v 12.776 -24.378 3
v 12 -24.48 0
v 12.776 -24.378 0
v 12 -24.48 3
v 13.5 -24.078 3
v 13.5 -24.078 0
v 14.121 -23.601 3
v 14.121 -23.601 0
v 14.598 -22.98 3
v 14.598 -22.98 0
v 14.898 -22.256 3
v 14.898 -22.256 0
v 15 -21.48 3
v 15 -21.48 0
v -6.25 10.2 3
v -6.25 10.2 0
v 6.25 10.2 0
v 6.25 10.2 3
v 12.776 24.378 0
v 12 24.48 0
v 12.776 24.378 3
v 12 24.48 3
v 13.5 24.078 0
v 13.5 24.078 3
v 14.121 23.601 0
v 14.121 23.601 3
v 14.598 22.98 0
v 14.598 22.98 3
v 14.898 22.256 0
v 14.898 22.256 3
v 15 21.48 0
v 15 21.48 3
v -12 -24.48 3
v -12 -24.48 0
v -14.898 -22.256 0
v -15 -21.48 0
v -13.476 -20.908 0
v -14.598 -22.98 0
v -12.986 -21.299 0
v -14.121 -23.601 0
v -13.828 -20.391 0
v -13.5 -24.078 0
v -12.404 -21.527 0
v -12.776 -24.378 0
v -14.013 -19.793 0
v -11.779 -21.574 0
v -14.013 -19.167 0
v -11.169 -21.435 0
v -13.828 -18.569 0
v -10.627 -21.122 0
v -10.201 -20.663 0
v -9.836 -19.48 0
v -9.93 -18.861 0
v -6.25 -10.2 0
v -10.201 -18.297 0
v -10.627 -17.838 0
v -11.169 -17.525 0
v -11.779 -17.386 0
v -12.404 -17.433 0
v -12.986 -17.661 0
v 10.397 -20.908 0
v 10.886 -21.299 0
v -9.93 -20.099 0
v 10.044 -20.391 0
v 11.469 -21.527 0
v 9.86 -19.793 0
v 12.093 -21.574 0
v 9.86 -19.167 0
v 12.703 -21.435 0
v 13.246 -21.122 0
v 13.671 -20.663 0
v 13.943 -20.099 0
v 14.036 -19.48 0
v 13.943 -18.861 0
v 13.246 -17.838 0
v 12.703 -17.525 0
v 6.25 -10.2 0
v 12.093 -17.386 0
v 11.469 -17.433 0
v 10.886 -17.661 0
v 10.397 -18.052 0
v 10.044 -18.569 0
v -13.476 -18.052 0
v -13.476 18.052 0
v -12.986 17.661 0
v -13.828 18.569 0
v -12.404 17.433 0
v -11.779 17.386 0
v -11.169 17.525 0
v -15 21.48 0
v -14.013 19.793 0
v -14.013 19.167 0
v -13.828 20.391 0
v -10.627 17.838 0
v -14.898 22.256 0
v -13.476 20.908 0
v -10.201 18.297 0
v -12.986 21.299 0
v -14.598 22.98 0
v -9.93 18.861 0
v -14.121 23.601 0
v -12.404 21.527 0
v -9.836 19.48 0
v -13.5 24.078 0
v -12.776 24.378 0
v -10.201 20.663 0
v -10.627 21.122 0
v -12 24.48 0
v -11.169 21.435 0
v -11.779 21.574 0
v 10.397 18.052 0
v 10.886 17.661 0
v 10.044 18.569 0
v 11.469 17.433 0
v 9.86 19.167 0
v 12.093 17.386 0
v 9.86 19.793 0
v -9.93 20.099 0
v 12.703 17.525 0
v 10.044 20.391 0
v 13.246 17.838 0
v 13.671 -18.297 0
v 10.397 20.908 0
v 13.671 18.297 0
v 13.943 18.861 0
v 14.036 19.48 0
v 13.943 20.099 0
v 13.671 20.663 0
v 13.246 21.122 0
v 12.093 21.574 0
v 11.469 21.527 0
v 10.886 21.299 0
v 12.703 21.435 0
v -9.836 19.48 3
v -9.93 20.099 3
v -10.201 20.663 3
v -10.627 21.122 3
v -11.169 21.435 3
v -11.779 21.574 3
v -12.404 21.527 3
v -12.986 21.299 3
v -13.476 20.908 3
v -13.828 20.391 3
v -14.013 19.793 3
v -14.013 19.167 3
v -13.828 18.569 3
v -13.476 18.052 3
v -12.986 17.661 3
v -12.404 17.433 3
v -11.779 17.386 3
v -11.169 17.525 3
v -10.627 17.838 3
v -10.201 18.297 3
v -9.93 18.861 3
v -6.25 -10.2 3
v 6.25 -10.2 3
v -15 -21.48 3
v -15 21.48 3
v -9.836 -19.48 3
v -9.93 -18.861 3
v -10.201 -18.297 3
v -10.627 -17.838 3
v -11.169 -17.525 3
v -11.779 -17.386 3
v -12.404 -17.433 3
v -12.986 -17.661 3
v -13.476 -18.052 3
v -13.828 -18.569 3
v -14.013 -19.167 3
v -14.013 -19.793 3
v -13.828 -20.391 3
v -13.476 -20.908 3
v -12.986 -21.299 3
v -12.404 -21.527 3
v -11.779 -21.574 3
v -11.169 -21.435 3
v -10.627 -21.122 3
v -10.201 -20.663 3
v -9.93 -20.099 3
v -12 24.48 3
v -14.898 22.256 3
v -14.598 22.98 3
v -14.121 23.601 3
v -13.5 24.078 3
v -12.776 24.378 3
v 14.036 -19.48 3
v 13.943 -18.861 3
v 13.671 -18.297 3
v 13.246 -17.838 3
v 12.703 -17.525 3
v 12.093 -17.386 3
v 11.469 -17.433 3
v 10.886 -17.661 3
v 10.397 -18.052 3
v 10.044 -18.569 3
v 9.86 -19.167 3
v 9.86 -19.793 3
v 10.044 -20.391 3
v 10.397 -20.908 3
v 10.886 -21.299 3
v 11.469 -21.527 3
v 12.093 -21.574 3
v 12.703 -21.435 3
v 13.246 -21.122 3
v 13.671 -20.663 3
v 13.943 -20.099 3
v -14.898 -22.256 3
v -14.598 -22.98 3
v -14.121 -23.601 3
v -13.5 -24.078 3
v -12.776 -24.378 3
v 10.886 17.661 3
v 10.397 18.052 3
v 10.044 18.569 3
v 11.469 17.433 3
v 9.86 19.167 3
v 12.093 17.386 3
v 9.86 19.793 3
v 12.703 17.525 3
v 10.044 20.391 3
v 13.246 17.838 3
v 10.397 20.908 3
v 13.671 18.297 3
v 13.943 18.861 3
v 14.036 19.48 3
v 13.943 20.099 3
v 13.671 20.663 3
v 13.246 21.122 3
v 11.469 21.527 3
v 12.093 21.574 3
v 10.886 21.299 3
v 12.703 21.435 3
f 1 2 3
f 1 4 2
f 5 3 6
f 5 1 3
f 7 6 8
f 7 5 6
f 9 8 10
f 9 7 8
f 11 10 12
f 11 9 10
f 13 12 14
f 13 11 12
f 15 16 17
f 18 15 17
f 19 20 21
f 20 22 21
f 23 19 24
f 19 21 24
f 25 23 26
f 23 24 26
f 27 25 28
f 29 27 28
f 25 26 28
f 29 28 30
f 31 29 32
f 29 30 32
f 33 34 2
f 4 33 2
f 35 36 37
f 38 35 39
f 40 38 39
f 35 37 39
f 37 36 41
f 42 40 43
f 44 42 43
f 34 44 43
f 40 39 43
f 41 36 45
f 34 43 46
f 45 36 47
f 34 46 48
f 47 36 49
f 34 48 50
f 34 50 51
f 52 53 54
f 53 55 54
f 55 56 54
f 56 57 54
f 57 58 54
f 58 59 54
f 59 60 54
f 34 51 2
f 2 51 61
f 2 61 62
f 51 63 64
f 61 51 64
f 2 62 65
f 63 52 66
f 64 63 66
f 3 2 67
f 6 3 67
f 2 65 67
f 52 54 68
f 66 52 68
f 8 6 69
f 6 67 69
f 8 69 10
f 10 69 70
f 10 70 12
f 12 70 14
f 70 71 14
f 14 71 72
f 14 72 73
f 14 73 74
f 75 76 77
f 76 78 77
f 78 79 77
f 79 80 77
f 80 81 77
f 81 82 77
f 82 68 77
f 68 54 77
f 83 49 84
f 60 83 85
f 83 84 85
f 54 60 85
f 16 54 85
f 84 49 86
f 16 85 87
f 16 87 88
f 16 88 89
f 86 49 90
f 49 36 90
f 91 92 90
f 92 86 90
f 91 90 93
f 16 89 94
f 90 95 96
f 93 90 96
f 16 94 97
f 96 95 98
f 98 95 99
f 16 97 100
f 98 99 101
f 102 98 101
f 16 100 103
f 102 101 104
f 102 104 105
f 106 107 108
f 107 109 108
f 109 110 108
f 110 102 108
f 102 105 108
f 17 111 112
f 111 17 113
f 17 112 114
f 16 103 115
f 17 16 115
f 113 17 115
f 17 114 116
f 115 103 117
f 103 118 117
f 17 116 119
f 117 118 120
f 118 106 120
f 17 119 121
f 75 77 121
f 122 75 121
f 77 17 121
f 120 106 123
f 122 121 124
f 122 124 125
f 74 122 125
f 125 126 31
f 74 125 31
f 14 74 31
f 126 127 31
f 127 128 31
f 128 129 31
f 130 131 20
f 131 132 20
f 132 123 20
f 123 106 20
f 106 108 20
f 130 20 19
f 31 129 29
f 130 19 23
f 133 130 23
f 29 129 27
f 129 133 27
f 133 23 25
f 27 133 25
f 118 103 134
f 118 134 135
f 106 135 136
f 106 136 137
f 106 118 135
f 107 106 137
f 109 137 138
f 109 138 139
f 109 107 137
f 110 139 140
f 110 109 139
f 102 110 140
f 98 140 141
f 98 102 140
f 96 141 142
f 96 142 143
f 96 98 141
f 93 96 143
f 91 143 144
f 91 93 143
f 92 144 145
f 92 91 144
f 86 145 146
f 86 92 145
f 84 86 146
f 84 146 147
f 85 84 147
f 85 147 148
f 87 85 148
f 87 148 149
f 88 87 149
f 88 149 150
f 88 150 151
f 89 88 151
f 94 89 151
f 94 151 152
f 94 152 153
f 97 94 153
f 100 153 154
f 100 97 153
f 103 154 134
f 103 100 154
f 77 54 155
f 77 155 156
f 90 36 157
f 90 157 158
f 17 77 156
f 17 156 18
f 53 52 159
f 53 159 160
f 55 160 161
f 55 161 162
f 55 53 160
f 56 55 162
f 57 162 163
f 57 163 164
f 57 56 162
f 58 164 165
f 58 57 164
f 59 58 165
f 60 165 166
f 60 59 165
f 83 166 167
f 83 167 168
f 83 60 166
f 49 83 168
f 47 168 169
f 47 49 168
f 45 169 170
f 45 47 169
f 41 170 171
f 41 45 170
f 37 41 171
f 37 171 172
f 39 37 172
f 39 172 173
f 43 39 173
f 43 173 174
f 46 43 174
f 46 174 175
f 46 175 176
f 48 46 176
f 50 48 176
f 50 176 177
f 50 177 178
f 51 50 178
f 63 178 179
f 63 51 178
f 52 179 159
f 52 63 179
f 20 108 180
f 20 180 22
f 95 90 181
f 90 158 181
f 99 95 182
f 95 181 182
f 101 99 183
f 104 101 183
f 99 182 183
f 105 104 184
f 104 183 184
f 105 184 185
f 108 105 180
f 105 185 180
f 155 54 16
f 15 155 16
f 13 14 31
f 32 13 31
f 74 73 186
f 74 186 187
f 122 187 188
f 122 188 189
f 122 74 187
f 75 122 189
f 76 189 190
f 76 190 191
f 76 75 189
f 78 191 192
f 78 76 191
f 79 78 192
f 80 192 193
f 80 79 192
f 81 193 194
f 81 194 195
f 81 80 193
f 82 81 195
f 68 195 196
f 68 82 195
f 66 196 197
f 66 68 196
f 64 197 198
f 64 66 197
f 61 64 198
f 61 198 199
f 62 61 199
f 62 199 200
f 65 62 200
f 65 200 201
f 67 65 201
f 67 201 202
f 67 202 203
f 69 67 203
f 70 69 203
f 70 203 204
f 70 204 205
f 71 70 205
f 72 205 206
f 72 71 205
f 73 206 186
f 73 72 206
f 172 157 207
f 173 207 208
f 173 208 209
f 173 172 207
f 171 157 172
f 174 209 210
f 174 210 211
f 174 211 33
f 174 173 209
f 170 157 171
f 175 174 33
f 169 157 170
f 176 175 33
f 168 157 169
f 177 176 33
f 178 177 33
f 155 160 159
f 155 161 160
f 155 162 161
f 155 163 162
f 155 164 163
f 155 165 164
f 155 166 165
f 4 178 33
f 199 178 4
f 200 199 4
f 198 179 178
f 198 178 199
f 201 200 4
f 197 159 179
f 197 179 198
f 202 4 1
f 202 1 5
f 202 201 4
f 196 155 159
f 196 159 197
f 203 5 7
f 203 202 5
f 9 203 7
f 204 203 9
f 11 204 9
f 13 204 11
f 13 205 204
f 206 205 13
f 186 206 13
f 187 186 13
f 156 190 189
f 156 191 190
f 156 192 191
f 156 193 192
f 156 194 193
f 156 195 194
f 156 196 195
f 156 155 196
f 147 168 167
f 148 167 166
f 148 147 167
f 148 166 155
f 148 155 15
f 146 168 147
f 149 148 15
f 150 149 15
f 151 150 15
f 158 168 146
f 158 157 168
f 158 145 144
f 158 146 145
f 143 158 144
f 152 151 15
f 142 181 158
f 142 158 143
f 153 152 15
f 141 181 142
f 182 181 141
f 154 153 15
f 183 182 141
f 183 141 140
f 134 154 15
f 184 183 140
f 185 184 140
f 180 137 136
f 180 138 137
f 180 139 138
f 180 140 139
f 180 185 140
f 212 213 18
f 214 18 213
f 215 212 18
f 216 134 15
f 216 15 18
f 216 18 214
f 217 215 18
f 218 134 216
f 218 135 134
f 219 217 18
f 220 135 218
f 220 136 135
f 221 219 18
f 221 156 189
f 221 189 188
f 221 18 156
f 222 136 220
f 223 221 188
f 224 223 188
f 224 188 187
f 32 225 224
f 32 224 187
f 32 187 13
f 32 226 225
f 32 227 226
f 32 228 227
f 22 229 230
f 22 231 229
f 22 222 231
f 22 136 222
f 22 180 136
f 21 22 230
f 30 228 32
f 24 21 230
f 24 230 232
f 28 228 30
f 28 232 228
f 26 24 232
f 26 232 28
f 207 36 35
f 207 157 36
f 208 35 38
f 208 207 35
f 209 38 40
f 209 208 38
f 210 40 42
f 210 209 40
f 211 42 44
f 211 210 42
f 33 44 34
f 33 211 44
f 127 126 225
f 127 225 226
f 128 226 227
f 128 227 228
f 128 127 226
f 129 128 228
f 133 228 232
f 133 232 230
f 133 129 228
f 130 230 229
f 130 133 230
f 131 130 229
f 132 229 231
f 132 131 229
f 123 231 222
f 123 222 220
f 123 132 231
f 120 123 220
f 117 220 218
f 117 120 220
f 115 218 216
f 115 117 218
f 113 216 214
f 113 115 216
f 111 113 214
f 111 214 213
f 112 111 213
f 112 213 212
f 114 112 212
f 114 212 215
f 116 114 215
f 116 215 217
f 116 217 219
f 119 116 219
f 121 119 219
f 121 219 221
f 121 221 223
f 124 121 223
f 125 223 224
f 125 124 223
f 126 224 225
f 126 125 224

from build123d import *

# Parameters (mm, degrees)
SKETCH1_W           = 30
SKETCH1_H           = 48.96
SKETCH1_R           = 2.1
SKETCH1_W_2         = 12.5
SKETCH1_H_2         = 20.4
BOSS_EXTRUDE1_DEPTH = 3
FILLET1_R           = 3


with BuildPart() as part:
    # Sketch1 → Boss-Extrude1 (new body)
    with BuildSketch(Plane.XY):
        Rectangle(SKETCH1_W, SKETCH1_H)
        with Locations((-11.93627451, 19.48)):
            Circle(SKETCH1_R, mode=Mode.SUBTRACT)
        with Locations((11.93627451, 19.48)):
            Circle(SKETCH1_R, mode=Mode.SUBTRACT)
        with Locations((11.93627451, -19.48)):
            Circle(SKETCH1_R, mode=Mode.SUBTRACT)
        with Locations((-11.93627451, -19.48)):
            Circle(SKETCH1_R, mode=Mode.SUBTRACT)
        Rectangle(SKETCH1_W_2, SKETCH1_H_2, mode=Mode.SUBTRACT)
    extrude(amount=BOSS_EXTRUDE1_DEPTH)

    # Fillet1
    fillet1_edges = [part.edges().sort_by_distance(p)[0] for p in [
        (15, -24.48, 1.5),
        (-15, -24.48, 1.5),
        (-15, 24.48, 1.5),
        (15, 24.48, 1.5),
    ]]
    fillet(fillet1_edges, radius=FILLET1_R)


solid = part.part
